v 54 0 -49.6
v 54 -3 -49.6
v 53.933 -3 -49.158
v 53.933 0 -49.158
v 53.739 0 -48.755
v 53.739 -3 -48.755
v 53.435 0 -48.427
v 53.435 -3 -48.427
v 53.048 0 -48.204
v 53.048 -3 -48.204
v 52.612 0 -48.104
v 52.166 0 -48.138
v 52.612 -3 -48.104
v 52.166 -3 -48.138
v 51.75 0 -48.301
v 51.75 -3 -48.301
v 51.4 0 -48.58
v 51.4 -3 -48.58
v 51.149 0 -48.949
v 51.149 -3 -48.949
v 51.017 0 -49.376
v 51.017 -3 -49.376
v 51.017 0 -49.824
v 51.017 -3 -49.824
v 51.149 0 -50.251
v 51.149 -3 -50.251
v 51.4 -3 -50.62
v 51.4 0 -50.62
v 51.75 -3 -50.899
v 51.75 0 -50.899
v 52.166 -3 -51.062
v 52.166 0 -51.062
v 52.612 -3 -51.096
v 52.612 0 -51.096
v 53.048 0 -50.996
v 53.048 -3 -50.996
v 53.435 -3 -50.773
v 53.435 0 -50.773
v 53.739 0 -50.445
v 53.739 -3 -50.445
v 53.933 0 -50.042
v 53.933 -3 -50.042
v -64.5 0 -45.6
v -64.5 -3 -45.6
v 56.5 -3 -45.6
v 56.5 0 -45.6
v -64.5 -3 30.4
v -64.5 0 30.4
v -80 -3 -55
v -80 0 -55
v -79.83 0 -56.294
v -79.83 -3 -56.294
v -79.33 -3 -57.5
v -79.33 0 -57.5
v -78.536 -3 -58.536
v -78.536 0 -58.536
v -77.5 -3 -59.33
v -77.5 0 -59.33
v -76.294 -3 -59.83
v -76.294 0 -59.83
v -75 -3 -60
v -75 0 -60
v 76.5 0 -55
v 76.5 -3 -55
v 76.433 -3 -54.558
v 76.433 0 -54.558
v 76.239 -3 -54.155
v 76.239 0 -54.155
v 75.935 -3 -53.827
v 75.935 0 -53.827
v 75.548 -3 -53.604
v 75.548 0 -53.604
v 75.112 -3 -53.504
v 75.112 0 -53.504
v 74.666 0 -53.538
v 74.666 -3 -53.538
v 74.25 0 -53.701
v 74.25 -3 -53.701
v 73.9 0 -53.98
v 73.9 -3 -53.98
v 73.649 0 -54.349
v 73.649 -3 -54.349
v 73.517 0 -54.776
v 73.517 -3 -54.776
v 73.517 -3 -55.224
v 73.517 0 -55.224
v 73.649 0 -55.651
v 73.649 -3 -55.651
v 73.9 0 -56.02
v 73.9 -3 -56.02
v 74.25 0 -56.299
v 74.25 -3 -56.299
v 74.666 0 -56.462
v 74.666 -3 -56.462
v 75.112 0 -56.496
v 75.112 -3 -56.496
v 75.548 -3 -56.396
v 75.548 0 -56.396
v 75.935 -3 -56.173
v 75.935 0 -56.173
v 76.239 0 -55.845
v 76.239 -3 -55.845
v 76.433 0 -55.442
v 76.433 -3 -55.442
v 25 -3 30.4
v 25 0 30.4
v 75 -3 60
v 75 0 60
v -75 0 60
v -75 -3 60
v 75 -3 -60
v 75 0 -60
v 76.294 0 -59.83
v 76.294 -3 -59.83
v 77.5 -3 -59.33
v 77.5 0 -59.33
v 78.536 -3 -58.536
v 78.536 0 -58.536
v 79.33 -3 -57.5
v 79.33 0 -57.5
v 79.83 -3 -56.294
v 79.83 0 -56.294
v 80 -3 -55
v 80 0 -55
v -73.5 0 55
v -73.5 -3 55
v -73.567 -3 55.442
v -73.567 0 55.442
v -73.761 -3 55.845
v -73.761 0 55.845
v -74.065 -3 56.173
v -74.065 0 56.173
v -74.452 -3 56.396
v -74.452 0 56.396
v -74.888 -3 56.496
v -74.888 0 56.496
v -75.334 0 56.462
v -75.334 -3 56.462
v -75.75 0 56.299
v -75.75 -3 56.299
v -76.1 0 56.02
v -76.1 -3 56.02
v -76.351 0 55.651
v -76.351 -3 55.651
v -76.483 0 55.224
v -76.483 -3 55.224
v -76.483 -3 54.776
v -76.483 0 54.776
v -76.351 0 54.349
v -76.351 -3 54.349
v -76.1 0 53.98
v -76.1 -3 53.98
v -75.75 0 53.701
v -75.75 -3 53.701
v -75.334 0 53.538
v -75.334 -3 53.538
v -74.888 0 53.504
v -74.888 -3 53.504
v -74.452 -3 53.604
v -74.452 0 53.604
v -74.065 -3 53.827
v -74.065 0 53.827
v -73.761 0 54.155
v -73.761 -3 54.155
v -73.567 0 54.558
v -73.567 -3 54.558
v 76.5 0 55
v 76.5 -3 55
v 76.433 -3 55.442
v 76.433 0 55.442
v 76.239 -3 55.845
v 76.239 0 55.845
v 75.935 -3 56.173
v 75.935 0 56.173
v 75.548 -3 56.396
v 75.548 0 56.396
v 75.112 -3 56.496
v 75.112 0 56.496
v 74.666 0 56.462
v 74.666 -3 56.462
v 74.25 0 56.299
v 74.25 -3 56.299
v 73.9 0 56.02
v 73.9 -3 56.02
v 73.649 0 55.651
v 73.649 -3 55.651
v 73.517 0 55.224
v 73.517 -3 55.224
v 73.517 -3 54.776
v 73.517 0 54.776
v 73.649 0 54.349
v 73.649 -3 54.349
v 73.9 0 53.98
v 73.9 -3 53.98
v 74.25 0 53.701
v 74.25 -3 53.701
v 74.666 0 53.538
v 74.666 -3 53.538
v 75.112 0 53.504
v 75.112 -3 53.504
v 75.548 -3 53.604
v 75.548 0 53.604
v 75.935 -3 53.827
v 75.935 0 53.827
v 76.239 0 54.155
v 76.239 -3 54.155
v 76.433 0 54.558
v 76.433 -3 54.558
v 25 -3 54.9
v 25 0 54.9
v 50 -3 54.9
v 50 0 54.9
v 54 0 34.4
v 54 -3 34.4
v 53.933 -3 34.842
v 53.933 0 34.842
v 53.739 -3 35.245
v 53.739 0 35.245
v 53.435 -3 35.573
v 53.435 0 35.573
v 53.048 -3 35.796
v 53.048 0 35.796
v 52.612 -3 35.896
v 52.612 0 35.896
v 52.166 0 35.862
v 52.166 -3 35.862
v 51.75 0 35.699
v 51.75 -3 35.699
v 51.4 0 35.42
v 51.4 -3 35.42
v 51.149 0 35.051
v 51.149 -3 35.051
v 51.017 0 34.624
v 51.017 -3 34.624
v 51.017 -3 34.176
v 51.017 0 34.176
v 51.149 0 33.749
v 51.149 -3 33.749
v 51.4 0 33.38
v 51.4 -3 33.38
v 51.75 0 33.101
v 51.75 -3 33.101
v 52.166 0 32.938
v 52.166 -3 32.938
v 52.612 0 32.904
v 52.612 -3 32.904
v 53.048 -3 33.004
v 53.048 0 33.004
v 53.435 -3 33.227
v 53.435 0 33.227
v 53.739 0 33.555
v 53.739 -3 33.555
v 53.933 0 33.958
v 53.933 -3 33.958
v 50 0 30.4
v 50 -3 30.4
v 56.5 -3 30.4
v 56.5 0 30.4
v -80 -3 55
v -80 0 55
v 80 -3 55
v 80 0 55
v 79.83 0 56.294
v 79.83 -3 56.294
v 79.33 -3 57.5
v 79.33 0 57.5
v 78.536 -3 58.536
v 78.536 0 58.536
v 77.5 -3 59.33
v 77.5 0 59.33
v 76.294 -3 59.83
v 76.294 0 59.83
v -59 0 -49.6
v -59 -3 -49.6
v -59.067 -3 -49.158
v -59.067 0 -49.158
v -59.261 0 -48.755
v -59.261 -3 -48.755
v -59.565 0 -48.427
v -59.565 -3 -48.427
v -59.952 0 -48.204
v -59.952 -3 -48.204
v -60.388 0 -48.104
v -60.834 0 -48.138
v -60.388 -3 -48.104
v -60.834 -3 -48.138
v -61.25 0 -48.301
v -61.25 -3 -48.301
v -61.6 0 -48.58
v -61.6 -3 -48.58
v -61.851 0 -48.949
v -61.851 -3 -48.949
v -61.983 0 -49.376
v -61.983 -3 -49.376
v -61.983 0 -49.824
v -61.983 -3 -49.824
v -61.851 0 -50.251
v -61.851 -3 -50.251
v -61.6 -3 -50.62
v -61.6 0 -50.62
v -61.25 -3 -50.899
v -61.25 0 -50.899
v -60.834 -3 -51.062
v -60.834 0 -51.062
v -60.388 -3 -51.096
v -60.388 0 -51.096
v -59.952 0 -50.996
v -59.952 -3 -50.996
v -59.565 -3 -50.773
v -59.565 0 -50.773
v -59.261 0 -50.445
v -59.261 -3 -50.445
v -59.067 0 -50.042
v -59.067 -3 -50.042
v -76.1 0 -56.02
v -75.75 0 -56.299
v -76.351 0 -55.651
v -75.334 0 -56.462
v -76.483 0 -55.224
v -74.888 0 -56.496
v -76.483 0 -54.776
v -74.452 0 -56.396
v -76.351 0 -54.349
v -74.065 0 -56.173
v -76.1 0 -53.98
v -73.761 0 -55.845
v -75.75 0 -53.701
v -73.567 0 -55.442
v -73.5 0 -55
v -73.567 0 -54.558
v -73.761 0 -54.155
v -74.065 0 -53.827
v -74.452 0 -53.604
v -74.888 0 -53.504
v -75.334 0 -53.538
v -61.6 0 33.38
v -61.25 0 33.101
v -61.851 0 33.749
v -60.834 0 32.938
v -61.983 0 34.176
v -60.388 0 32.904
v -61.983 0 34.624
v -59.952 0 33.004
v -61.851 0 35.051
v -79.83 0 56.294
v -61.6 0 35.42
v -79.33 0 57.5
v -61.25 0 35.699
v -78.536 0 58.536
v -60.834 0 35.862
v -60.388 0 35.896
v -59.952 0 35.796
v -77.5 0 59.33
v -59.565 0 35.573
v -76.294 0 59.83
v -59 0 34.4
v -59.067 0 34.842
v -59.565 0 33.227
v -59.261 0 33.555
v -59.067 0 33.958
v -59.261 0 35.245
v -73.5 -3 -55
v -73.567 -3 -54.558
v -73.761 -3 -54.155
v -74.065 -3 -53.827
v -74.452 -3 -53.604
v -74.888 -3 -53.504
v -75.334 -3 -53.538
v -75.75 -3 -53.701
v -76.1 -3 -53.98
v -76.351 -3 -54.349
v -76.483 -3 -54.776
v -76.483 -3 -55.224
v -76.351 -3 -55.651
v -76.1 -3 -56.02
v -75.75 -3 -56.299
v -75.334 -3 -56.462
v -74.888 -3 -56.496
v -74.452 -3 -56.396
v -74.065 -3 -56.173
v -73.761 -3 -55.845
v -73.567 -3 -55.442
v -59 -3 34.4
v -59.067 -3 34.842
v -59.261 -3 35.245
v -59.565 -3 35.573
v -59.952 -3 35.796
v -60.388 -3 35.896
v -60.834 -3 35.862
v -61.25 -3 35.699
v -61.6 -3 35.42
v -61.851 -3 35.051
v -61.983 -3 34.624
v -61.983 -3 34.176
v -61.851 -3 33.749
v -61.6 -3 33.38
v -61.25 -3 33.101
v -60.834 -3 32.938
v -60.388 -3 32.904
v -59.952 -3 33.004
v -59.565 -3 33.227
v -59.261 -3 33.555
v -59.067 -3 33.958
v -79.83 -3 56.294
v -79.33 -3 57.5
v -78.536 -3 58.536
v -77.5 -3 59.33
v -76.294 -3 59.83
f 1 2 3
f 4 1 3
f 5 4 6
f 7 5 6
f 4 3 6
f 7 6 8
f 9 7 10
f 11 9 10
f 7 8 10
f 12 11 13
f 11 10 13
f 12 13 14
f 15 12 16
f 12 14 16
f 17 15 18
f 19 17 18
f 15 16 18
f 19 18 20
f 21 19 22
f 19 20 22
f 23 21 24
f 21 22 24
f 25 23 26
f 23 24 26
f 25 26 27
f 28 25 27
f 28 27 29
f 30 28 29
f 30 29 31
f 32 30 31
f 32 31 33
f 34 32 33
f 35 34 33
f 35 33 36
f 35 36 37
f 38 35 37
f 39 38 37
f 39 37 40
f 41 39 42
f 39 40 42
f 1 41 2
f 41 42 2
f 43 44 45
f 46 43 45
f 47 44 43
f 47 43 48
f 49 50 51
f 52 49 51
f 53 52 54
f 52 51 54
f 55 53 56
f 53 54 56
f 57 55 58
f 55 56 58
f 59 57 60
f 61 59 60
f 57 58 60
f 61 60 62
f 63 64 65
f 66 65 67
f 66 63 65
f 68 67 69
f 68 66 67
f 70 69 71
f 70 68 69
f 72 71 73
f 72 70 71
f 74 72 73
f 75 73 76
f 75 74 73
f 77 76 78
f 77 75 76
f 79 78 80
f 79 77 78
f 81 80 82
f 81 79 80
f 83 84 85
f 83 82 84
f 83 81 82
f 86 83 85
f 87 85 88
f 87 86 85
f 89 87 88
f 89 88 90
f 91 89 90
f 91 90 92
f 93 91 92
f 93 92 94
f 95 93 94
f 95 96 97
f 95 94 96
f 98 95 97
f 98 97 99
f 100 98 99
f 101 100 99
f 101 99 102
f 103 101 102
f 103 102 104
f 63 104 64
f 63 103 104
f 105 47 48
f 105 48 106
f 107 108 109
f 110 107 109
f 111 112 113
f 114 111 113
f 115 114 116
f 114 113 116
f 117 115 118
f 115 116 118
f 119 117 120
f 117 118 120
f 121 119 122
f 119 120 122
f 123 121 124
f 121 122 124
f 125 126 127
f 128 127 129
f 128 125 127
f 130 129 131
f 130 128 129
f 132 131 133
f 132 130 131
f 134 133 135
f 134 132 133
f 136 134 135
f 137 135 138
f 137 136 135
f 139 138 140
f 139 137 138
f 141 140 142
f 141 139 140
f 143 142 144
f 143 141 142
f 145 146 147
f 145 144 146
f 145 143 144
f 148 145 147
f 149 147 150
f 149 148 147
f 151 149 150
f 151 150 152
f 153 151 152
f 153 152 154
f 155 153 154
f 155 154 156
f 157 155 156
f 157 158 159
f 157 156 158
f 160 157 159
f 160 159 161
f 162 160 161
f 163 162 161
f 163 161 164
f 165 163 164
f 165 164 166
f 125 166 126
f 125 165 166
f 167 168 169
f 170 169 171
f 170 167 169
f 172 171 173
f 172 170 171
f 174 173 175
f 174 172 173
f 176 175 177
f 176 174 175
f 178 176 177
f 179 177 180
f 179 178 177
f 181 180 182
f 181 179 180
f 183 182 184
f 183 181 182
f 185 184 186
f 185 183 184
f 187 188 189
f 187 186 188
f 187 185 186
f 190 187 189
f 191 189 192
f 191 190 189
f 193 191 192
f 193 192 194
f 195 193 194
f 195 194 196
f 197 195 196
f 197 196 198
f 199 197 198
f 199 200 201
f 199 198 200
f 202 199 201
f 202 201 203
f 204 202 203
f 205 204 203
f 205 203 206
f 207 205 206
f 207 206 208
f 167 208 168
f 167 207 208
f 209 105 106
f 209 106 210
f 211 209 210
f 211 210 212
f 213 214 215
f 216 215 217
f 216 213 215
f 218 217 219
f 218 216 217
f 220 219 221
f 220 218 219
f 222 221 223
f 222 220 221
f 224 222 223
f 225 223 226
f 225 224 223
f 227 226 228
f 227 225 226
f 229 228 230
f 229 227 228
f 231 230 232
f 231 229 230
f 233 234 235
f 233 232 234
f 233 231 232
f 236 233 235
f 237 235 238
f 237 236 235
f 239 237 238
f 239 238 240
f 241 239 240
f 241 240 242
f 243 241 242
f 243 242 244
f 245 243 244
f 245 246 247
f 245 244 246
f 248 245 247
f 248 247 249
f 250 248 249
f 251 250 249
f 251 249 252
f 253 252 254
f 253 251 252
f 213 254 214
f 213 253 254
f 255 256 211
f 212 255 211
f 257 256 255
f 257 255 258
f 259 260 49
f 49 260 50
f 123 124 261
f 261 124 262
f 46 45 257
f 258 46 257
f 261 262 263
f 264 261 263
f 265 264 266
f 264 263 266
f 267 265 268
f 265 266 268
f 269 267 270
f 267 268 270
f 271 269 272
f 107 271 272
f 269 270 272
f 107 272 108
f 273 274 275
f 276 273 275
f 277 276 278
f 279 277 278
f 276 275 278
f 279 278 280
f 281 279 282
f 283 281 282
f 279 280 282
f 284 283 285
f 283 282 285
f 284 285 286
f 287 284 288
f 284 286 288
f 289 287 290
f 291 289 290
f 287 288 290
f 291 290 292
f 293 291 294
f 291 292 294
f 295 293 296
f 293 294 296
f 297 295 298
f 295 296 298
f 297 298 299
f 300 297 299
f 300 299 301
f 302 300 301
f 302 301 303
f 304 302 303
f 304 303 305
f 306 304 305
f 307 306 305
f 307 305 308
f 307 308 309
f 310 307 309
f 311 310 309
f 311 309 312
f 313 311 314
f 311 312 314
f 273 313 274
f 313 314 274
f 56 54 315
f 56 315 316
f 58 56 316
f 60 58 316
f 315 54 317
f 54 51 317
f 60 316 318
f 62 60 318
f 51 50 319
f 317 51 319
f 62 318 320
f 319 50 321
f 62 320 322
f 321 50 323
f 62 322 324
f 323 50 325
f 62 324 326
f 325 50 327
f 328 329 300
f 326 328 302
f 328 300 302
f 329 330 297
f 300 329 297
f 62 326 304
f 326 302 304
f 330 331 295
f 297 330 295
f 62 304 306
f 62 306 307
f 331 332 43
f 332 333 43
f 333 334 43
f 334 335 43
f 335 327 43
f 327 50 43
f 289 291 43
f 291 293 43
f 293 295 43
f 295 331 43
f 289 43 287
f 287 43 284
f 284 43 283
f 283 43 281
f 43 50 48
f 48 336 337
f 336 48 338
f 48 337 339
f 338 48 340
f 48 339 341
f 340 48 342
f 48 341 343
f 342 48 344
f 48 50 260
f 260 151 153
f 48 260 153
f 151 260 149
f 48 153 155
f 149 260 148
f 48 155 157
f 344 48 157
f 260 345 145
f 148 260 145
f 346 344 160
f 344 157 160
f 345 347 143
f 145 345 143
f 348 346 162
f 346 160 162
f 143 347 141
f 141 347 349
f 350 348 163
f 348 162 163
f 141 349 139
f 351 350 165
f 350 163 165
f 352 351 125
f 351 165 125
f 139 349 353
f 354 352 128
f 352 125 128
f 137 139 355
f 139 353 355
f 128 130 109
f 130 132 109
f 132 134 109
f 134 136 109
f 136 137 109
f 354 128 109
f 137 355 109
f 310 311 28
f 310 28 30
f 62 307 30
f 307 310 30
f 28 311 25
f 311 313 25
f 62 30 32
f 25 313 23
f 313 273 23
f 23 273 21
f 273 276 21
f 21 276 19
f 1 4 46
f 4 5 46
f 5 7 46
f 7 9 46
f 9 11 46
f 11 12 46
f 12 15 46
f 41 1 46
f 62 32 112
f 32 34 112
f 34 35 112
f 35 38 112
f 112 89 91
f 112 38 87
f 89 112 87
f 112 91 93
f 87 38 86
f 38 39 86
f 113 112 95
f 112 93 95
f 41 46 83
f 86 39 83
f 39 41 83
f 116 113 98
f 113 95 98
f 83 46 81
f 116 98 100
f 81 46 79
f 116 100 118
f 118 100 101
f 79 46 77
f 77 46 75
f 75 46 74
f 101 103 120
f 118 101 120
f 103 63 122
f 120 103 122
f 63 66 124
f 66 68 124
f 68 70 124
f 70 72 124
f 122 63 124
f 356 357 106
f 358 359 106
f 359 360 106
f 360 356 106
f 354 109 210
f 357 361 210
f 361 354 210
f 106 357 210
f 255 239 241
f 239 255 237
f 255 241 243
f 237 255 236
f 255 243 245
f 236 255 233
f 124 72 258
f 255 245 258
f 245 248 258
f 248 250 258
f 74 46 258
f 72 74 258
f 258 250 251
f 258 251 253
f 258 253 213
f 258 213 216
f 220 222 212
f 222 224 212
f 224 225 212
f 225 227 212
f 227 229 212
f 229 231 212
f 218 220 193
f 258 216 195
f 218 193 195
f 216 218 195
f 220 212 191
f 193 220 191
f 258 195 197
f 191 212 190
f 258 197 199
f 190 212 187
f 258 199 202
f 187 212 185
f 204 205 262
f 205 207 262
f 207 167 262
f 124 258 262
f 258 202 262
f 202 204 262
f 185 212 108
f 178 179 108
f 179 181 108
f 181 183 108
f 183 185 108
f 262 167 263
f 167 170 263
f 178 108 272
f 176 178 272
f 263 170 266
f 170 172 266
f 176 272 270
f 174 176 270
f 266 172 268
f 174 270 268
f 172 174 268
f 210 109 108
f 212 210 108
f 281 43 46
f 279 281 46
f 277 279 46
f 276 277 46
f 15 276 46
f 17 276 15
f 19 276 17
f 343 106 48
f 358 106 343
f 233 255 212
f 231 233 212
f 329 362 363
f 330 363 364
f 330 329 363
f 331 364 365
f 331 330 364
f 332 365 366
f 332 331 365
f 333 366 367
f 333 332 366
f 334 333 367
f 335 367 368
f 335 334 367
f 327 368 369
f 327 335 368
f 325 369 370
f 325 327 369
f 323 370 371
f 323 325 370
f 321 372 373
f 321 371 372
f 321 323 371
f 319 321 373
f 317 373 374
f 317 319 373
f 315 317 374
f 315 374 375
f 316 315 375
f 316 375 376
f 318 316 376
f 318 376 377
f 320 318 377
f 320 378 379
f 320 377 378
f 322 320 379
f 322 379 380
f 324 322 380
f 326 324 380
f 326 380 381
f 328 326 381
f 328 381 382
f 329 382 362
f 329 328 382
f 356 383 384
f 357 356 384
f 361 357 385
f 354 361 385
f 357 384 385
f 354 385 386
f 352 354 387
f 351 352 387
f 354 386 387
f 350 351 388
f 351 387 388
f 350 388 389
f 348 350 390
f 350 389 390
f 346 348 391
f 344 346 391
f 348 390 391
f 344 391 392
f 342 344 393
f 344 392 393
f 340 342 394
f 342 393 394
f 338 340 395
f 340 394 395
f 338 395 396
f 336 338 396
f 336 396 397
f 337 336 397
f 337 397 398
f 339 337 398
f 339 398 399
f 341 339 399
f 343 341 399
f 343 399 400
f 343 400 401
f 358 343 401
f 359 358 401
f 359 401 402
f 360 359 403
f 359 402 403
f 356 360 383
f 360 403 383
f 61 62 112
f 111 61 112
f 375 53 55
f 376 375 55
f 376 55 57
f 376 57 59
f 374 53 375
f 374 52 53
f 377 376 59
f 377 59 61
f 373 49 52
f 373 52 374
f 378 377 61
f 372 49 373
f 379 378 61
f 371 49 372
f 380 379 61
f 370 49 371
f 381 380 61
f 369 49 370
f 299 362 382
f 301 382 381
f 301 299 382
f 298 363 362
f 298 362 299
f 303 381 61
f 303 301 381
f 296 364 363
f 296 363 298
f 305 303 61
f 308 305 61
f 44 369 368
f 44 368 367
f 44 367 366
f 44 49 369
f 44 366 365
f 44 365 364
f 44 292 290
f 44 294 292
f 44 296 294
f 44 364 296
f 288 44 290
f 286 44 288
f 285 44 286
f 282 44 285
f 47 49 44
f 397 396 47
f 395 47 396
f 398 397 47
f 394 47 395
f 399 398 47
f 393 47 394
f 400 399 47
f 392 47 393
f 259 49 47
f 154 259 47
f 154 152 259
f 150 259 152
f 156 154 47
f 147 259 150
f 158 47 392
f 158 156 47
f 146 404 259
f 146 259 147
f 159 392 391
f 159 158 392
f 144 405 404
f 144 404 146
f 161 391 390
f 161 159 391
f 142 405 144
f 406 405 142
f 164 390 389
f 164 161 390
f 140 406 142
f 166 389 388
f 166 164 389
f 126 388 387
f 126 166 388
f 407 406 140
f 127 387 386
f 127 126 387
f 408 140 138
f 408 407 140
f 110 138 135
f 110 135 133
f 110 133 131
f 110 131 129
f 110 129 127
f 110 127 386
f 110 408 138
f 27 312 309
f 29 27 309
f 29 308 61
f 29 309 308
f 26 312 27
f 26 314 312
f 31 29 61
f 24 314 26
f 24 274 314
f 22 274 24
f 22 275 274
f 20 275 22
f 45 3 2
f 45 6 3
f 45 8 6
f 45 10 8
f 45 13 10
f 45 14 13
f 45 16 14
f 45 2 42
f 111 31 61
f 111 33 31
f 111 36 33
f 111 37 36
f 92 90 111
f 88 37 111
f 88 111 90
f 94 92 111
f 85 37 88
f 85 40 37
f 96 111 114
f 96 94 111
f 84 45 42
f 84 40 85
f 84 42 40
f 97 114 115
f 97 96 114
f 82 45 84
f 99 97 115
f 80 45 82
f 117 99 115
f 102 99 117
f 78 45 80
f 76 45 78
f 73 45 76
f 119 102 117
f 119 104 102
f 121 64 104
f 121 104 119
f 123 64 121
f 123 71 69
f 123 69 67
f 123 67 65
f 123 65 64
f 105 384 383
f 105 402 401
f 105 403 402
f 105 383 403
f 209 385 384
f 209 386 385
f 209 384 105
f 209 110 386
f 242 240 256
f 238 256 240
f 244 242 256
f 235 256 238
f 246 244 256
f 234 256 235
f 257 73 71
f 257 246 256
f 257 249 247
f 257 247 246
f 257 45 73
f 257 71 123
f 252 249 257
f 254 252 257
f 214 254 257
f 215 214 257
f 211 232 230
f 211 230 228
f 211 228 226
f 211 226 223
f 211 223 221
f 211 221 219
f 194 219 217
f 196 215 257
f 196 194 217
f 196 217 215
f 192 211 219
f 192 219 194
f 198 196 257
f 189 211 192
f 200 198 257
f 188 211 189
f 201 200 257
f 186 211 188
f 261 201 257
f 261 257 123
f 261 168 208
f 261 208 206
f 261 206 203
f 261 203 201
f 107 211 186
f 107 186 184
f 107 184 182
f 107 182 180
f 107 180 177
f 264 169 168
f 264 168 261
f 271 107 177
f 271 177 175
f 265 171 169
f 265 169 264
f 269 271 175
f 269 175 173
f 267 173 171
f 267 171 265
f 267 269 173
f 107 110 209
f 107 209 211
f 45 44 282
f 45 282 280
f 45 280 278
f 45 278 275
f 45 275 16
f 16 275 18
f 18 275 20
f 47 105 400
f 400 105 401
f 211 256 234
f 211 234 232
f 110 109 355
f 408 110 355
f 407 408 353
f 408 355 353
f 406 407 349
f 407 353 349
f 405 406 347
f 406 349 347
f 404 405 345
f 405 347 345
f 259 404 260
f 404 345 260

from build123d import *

# Parameters (mm, degrees)
F1_DEPTH = 3
F2_R     = 1.5
F3_DEPTH = 25
F4_R     = 1.5
F5_DEPTH = 25
F6_W     = 121
F6_H     = 76
F6_R     = 1.5
F7_DEPTH = 3
F8_W     = 25
F8_H     = 24.5
F9_DEPTH = 3


# Not quite as in the source:
# - a feature names something its author has since deleted; it is built from what else it names


with BuildPart() as f1:
    # F0 (on Front) → F1 (new body)
    with BuildSketch(Plane.XZ):
        with BuildLine():
            Line((-75, -60), (75, -60))
            ThreePointArc((75, -60), (78.5355339059, -58.5355339059), (80, -55))
            Line((80, -55), (80, 55))
            ThreePointArc((80, 55), (78.5355339059, 58.5355339059), (75, 60))
            Line((75, 60), (-75, 60))
            ThreePointArc((-75, 60), (-78.5355339059, 58.5355339059), (-80, 55))
            Line((-80, 55), (-80, -55))
            ThreePointArc((-80, -55), (-78.5355339059, -58.5355339059), (-75, -60))
        make_face()
    extrude(amount=F1_DEPTH)

    # F2 (on Front) → F3 (cut)
    with BuildSketch(Plane.XZ):
        with Locations((-75, 55)):
            Circle(F2_R)
        with Locations((75, 55)):
            Circle(F2_R)
        with Locations((75, -55)):
            Circle(F2_R)
        with Locations((-75, -55)):
            Circle(F2_R)
    extrude(amount=F3_DEPTH, mode=Mode.SUBTRACT)

    # F4 (on Front) → F5 (cut)
    with BuildSketch(Plane.XZ):
        with Locations((52.5, 34.4)):
            Circle(F4_R)
    extrude(amount=F5_DEPTH, mode=Mode.SUBTRACT)

    # F6 (on face) → F7 (cut)
    with BuildSketch(Plane.XZ.offset(3)):
        with Locations((-4, -7.6)):
            Rectangle(F6_W, F6_H)
        with Locations((52.5, 34.4)):
            Circle(F6_R)
        with Locations((-60.5, 34.4)):
            Circle(F6_R)
        with Locations((-60.5, -49.6)):
            Circle(F6_R)
        with Locations((52.5, -49.6)):
            Circle(F6_R)
    extrude(amount=-F7_DEPTH, mode=Mode.SUBTRACT)

    # F8 (on face) → F9 (cut)
    with BuildSketch(Plane.XZ.offset(3)):
        with Locations((37.5, 42.65)):
            Rectangle(F8_W, F8_H)
    extrude(amount=-F9_DEPTH, mode=Mode.SUBTRACT)


solid = f1.part
